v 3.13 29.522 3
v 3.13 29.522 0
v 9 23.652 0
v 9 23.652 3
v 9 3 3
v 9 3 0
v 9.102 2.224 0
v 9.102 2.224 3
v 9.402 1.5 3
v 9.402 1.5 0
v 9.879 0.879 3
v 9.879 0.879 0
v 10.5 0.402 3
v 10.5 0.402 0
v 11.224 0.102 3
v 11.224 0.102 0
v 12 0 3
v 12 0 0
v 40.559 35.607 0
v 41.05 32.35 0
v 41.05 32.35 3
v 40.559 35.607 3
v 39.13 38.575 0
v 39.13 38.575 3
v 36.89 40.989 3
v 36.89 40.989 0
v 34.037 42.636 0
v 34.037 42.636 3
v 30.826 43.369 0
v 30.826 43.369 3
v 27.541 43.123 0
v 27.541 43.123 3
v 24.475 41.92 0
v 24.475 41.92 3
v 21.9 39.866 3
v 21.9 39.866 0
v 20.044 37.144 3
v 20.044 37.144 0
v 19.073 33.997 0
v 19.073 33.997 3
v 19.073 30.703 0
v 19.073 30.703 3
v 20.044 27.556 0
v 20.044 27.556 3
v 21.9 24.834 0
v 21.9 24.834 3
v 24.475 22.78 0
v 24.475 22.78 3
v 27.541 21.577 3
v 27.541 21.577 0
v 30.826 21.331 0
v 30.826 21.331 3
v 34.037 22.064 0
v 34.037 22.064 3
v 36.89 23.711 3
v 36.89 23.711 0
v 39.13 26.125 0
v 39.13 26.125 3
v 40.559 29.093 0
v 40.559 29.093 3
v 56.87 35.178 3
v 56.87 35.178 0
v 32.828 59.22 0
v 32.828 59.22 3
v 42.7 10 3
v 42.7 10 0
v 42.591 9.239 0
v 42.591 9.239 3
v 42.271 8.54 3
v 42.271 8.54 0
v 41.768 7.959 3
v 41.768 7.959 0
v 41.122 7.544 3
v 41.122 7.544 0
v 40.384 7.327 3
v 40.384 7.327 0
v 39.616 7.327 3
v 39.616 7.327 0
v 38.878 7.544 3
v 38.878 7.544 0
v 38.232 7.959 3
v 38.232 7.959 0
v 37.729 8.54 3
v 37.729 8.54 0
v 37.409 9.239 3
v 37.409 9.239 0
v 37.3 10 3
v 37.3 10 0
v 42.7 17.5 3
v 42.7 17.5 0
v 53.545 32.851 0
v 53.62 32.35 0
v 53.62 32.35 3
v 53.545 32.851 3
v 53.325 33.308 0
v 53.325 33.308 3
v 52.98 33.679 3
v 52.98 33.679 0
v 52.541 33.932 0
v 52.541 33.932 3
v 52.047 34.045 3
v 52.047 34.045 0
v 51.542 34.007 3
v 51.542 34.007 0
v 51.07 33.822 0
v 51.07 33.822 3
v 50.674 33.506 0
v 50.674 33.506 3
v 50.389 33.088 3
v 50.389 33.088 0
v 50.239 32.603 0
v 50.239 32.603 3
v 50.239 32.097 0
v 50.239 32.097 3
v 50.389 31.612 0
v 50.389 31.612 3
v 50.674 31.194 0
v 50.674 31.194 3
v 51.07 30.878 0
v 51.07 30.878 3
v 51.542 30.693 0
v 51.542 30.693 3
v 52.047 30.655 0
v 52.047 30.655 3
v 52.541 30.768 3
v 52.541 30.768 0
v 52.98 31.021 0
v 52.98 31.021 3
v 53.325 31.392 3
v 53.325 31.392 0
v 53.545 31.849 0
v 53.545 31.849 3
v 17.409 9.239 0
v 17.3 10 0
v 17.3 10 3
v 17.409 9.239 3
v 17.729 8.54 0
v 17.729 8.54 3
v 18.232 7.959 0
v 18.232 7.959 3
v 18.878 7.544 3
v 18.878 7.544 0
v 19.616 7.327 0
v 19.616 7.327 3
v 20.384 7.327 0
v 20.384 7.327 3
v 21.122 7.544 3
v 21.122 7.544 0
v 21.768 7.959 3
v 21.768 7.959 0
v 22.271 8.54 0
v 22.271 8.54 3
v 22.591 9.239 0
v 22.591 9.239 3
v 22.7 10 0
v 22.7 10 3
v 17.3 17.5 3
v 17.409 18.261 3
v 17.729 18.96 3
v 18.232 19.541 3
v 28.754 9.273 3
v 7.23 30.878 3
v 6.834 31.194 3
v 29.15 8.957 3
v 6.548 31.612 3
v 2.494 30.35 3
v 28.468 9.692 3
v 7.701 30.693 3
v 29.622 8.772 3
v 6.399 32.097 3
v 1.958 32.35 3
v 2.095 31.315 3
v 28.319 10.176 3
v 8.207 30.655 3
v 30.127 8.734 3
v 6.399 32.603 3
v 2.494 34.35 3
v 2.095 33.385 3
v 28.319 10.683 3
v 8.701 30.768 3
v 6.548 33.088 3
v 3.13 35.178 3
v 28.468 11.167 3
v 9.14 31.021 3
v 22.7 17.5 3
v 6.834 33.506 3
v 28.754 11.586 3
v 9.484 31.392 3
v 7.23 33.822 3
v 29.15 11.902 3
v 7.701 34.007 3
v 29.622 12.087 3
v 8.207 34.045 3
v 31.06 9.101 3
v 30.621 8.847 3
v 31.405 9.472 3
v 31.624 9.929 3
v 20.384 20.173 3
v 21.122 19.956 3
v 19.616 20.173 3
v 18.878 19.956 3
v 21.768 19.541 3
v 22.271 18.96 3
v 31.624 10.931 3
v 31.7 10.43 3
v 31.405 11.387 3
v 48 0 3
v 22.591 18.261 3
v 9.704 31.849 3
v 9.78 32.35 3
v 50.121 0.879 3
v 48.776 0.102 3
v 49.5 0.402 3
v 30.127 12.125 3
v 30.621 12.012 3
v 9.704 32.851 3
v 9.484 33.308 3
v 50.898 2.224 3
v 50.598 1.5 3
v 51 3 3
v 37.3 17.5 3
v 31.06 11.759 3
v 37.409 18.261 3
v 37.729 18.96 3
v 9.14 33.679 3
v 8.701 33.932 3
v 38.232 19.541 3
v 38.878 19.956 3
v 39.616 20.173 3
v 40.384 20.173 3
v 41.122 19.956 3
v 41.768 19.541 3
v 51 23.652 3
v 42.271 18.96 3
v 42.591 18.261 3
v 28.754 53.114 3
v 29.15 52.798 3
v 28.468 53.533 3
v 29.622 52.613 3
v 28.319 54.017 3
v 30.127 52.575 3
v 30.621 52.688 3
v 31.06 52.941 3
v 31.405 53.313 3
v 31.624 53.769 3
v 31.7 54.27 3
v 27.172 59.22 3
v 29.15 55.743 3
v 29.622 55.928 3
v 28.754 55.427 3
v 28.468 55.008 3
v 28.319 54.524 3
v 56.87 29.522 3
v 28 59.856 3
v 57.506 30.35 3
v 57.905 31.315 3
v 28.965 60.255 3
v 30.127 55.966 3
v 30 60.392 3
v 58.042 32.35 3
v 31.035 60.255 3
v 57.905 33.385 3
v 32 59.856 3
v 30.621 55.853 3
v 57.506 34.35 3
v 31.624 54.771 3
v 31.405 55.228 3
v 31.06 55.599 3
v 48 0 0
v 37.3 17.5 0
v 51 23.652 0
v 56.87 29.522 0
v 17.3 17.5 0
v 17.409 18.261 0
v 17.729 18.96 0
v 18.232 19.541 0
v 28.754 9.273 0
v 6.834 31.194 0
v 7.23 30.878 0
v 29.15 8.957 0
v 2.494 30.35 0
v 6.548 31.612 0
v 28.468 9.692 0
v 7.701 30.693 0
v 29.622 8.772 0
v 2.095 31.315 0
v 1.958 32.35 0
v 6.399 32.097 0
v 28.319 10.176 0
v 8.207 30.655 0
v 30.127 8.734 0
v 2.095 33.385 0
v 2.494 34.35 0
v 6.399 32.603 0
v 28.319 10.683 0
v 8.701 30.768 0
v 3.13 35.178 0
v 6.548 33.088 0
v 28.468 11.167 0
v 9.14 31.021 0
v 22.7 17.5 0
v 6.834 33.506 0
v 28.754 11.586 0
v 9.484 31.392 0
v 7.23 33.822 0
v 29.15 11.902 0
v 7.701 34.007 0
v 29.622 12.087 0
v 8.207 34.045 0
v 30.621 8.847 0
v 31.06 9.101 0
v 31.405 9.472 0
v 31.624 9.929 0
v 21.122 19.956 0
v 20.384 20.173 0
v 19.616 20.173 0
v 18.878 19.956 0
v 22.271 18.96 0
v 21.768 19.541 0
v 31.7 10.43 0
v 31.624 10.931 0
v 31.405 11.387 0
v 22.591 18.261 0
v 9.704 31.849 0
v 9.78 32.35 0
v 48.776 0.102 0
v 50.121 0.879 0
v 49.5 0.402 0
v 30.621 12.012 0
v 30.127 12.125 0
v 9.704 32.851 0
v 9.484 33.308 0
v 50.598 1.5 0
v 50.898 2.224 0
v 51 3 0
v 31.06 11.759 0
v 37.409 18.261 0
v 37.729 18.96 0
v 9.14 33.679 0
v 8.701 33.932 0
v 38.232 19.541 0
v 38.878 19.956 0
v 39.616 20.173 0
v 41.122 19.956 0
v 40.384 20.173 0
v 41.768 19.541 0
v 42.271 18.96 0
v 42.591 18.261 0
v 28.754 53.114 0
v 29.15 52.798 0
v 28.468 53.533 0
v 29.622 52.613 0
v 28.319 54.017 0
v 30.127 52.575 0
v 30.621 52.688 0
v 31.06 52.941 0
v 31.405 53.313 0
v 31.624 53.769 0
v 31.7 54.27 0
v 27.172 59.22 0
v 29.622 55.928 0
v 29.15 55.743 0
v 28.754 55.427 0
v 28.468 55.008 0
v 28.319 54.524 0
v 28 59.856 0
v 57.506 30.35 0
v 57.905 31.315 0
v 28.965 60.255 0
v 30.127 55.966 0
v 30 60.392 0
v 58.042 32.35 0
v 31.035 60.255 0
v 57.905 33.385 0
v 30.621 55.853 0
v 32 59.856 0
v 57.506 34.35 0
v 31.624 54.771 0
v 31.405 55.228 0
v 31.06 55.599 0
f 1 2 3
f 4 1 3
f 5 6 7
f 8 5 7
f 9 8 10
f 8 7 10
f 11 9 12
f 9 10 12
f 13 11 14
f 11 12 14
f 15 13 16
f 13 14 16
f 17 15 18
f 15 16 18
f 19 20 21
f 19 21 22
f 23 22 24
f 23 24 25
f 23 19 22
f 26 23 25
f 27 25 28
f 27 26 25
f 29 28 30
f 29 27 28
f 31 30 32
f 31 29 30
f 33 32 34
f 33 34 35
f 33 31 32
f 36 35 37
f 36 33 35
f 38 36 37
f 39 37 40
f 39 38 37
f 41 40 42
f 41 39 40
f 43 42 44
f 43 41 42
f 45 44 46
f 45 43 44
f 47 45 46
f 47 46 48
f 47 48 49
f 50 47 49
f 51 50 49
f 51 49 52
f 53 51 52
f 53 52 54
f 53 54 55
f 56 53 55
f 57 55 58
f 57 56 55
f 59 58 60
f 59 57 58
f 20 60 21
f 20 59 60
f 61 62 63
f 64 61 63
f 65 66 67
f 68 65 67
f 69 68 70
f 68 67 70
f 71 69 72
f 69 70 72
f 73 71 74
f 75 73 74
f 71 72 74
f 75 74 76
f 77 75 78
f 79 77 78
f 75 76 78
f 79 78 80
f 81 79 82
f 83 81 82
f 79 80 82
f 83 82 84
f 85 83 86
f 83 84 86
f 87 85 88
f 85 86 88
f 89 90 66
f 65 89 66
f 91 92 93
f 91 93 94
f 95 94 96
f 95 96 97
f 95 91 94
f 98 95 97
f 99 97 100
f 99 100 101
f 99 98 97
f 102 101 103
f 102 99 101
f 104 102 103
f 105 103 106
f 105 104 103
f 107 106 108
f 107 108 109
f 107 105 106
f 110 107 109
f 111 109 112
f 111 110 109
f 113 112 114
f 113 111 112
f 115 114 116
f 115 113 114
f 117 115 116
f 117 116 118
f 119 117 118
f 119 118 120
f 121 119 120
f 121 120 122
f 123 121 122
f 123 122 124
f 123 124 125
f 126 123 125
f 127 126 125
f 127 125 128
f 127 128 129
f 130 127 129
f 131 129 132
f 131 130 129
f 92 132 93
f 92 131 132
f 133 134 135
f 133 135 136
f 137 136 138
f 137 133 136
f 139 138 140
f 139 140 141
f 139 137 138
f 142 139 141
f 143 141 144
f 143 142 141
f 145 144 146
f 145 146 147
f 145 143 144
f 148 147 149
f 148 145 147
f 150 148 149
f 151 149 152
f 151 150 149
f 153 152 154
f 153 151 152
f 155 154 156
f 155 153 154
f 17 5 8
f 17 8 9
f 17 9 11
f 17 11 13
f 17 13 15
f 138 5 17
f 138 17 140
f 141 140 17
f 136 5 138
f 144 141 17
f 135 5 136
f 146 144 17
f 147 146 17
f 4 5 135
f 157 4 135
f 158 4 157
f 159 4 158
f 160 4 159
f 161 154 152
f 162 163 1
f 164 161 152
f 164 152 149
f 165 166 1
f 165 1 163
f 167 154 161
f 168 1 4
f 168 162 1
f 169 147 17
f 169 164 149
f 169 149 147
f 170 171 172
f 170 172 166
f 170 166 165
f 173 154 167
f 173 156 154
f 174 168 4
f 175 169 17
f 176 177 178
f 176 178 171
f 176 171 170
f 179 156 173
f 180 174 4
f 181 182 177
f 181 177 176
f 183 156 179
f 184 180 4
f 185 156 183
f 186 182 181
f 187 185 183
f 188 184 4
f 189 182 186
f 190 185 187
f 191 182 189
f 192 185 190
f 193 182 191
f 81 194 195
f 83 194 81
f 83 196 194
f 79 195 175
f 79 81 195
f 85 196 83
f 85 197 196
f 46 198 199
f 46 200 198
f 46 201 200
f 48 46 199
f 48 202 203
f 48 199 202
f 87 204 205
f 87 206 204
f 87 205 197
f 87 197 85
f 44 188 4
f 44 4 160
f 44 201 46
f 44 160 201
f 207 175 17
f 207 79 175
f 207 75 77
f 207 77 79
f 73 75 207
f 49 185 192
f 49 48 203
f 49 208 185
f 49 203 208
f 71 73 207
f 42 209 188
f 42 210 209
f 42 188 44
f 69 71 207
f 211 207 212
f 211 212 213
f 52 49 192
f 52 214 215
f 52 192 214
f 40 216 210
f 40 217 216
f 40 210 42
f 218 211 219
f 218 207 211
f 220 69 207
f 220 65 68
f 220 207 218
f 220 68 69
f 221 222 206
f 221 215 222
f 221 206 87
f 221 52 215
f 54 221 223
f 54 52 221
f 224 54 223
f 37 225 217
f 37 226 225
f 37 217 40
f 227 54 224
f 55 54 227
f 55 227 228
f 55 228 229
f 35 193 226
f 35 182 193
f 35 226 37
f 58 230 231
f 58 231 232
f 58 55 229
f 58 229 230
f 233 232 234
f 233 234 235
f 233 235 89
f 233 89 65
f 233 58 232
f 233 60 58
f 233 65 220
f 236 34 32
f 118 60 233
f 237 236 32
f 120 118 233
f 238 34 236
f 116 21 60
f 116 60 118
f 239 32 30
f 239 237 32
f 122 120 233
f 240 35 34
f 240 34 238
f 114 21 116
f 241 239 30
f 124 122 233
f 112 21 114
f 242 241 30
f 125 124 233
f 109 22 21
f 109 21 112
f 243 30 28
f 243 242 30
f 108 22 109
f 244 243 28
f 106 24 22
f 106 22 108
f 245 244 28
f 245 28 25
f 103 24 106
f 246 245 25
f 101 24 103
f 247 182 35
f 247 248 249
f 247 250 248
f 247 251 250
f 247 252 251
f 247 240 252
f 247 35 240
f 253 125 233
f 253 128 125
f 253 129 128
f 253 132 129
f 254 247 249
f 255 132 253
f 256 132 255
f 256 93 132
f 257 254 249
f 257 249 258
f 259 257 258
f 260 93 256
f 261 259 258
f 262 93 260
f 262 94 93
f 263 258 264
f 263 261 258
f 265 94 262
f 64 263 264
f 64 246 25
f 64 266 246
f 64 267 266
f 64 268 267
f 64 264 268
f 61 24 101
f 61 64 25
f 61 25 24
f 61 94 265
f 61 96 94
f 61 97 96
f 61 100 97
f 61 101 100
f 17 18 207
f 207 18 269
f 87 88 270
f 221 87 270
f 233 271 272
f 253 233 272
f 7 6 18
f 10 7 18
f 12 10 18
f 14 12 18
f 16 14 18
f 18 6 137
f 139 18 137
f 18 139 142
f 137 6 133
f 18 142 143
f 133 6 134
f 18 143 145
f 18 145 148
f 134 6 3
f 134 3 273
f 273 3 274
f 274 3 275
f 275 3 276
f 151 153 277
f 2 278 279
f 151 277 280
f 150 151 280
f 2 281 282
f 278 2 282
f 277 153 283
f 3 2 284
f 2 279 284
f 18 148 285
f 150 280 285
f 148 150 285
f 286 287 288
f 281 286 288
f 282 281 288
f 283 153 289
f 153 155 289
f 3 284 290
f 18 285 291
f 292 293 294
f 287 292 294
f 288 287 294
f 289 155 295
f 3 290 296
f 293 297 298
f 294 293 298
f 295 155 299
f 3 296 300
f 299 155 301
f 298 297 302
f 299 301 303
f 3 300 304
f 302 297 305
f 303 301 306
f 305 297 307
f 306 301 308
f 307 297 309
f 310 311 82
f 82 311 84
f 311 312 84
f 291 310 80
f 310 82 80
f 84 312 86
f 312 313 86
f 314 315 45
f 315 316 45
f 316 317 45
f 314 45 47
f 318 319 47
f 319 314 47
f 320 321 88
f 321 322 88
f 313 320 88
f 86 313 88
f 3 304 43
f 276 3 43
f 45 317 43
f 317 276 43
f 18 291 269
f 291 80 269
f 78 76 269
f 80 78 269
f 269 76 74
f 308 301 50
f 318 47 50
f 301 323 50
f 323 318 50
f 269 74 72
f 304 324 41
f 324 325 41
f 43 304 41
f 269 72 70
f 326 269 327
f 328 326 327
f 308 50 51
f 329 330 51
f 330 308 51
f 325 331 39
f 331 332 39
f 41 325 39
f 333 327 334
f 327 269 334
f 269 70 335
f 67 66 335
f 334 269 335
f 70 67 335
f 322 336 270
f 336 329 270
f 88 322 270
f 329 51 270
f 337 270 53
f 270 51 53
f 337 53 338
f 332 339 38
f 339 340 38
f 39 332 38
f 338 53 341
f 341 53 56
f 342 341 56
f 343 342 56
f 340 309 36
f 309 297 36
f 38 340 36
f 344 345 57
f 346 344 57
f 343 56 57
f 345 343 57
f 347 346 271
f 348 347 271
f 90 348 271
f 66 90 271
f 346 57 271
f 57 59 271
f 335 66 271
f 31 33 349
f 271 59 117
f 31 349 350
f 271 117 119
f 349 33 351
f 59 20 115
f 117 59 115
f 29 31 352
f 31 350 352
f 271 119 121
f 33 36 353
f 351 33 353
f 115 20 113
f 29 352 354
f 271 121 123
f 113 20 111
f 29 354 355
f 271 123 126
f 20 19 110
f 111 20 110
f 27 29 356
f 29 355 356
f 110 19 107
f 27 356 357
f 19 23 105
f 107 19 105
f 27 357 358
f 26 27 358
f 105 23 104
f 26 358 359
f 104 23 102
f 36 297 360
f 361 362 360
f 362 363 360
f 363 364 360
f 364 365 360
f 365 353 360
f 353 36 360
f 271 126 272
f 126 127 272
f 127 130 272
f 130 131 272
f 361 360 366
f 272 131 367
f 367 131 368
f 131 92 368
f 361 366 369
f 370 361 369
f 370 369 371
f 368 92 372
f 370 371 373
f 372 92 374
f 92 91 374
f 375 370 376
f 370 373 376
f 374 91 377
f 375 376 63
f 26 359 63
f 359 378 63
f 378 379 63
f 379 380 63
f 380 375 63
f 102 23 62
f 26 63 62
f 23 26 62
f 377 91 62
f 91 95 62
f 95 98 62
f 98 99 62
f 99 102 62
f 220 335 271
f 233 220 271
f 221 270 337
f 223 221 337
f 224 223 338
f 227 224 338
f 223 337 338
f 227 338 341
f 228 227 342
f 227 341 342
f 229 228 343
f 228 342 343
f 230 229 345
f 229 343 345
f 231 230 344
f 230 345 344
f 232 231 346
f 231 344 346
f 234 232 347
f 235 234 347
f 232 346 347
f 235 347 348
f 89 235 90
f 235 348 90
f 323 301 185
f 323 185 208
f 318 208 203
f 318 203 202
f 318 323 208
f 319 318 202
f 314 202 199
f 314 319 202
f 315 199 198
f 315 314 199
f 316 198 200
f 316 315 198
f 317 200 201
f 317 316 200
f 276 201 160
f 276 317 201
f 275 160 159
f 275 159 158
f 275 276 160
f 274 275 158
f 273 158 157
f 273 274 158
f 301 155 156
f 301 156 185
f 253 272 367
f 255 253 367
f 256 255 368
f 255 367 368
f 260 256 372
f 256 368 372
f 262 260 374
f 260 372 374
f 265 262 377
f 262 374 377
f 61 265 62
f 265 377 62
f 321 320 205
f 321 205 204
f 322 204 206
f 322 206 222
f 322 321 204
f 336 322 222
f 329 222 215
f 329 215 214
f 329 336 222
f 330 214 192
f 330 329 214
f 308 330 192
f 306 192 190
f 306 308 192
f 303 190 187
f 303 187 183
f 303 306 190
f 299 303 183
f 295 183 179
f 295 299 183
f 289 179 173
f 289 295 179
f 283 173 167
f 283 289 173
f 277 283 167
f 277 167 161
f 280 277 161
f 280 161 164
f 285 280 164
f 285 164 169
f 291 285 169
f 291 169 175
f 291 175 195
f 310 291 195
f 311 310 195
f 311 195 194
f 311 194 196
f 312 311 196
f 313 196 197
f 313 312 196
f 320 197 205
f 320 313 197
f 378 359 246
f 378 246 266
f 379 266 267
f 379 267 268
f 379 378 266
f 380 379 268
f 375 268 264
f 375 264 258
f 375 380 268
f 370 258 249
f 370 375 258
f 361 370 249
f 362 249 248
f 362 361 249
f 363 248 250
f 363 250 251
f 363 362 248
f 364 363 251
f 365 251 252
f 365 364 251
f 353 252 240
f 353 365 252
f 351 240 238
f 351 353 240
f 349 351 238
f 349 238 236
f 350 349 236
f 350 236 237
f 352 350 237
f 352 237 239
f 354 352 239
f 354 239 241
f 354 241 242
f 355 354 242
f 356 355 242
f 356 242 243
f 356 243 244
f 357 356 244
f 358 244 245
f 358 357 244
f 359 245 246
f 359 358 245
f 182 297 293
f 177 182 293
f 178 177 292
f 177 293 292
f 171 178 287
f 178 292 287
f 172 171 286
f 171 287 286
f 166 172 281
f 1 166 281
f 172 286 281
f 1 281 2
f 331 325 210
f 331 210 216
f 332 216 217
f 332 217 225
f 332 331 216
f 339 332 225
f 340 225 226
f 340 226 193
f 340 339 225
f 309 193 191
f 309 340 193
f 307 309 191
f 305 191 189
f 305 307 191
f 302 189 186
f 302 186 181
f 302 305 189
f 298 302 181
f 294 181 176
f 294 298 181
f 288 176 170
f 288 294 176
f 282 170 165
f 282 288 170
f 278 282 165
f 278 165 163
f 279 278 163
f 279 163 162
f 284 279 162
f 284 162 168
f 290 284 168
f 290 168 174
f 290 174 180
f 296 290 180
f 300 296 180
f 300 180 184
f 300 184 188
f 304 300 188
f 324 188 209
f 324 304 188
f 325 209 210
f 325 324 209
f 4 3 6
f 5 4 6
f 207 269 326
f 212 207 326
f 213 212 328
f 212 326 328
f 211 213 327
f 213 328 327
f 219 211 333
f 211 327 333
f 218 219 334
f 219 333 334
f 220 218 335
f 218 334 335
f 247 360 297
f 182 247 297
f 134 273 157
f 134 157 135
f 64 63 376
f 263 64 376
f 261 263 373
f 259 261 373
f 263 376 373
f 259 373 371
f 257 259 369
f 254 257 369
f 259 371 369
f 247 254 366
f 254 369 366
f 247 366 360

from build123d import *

# Parameters (mm, degrees)
MODEL_R                         = 1.7
MODEL_R_2                       = 11.05
AUFSATZ_LINEAR_AUSTRAGEN1_DEPTH = 3


with BuildPart() as part:
    # Model → Aufsatz-Linear austragen1 (new body)
    with BuildSketch(Plane.XY):
        with BuildLine():
            Line((51, 3), (51, 23.65151519))
            Line((51, 23.65151519), (56.870057685, 29.521572875))
            ThreePointArc((56.870057685, 29.521572875), (58.04163056, 32.35), (56.870057685, 35.178427125))
            Line((56.870057685, 35.178427125), (32.828427125, 59.220057685))
            ThreePointArc((32.828427125, 59.220057685), (30, 60.39163056), (27.171572875, 59.220057685))
            Line((27.171572875, 59.220057685), (3.129942315, 35.178427125))
            ThreePointArc((3.129942315, 35.178427125), (1.95836944, 32.35), (3.129942315, 29.521572875))
            Line((3.129942315, 29.521572875), (9, 23.65151519))
            Line((9, 23.65151519), (9, 3))
            ThreePointArc((9, 3), (9.878679656, 0.878679656), (12, 0))
            Line((12, 0), (48, 0))
            ThreePointArc((48, 0), (50.121320344, 0.878679656), (51, 3))
        make_face()
        with Locations((30, 10.429689783)):
            Circle(MODEL_R, mode=Mode.SUBTRACT)
        with Locations((51.920310217, 32.35)):
            Circle(MODEL_R, mode=Mode.SUBTRACT)
        with Locations((30, 54.270310217)):
            Circle(MODEL_R, mode=Mode.SUBTRACT)
        with Locations((8.079689783, 32.35)):
            Circle(MODEL_R, mode=Mode.SUBTRACT)
        with Locations((30, 32.35)):
            Circle(MODEL_R_2, mode=Mode.SUBTRACT)
        with BuildLine():
            Line((22.7, 10), (22.7, 17.5))
            ThreePointArc((22.7, 17.5), (20, 20.2), (17.3, 17.5))
            Line((17.3, 17.5), (17.3, 10))
            ThreePointArc((17.3, 10), (20, 7.3), (22.7, 10))
        make_face(mode=Mode.SUBTRACT)
        with BuildLine():
            Line((37.3, 10), (37.3, 17.5))
            ThreePointArc((37.3, 17.5), (40, 20.2), (42.7, 17.5))
            Line((42.7, 17.5), (42.7, 10))
            ThreePointArc((42.7, 10), (40, 7.3), (37.3, 10))
        make_face(mode=Mode.SUBTRACT)
    extrude(amount=AUFSATZ_LINEAR_AUSTRAGEN1_DEPTH)


solid = part.part
